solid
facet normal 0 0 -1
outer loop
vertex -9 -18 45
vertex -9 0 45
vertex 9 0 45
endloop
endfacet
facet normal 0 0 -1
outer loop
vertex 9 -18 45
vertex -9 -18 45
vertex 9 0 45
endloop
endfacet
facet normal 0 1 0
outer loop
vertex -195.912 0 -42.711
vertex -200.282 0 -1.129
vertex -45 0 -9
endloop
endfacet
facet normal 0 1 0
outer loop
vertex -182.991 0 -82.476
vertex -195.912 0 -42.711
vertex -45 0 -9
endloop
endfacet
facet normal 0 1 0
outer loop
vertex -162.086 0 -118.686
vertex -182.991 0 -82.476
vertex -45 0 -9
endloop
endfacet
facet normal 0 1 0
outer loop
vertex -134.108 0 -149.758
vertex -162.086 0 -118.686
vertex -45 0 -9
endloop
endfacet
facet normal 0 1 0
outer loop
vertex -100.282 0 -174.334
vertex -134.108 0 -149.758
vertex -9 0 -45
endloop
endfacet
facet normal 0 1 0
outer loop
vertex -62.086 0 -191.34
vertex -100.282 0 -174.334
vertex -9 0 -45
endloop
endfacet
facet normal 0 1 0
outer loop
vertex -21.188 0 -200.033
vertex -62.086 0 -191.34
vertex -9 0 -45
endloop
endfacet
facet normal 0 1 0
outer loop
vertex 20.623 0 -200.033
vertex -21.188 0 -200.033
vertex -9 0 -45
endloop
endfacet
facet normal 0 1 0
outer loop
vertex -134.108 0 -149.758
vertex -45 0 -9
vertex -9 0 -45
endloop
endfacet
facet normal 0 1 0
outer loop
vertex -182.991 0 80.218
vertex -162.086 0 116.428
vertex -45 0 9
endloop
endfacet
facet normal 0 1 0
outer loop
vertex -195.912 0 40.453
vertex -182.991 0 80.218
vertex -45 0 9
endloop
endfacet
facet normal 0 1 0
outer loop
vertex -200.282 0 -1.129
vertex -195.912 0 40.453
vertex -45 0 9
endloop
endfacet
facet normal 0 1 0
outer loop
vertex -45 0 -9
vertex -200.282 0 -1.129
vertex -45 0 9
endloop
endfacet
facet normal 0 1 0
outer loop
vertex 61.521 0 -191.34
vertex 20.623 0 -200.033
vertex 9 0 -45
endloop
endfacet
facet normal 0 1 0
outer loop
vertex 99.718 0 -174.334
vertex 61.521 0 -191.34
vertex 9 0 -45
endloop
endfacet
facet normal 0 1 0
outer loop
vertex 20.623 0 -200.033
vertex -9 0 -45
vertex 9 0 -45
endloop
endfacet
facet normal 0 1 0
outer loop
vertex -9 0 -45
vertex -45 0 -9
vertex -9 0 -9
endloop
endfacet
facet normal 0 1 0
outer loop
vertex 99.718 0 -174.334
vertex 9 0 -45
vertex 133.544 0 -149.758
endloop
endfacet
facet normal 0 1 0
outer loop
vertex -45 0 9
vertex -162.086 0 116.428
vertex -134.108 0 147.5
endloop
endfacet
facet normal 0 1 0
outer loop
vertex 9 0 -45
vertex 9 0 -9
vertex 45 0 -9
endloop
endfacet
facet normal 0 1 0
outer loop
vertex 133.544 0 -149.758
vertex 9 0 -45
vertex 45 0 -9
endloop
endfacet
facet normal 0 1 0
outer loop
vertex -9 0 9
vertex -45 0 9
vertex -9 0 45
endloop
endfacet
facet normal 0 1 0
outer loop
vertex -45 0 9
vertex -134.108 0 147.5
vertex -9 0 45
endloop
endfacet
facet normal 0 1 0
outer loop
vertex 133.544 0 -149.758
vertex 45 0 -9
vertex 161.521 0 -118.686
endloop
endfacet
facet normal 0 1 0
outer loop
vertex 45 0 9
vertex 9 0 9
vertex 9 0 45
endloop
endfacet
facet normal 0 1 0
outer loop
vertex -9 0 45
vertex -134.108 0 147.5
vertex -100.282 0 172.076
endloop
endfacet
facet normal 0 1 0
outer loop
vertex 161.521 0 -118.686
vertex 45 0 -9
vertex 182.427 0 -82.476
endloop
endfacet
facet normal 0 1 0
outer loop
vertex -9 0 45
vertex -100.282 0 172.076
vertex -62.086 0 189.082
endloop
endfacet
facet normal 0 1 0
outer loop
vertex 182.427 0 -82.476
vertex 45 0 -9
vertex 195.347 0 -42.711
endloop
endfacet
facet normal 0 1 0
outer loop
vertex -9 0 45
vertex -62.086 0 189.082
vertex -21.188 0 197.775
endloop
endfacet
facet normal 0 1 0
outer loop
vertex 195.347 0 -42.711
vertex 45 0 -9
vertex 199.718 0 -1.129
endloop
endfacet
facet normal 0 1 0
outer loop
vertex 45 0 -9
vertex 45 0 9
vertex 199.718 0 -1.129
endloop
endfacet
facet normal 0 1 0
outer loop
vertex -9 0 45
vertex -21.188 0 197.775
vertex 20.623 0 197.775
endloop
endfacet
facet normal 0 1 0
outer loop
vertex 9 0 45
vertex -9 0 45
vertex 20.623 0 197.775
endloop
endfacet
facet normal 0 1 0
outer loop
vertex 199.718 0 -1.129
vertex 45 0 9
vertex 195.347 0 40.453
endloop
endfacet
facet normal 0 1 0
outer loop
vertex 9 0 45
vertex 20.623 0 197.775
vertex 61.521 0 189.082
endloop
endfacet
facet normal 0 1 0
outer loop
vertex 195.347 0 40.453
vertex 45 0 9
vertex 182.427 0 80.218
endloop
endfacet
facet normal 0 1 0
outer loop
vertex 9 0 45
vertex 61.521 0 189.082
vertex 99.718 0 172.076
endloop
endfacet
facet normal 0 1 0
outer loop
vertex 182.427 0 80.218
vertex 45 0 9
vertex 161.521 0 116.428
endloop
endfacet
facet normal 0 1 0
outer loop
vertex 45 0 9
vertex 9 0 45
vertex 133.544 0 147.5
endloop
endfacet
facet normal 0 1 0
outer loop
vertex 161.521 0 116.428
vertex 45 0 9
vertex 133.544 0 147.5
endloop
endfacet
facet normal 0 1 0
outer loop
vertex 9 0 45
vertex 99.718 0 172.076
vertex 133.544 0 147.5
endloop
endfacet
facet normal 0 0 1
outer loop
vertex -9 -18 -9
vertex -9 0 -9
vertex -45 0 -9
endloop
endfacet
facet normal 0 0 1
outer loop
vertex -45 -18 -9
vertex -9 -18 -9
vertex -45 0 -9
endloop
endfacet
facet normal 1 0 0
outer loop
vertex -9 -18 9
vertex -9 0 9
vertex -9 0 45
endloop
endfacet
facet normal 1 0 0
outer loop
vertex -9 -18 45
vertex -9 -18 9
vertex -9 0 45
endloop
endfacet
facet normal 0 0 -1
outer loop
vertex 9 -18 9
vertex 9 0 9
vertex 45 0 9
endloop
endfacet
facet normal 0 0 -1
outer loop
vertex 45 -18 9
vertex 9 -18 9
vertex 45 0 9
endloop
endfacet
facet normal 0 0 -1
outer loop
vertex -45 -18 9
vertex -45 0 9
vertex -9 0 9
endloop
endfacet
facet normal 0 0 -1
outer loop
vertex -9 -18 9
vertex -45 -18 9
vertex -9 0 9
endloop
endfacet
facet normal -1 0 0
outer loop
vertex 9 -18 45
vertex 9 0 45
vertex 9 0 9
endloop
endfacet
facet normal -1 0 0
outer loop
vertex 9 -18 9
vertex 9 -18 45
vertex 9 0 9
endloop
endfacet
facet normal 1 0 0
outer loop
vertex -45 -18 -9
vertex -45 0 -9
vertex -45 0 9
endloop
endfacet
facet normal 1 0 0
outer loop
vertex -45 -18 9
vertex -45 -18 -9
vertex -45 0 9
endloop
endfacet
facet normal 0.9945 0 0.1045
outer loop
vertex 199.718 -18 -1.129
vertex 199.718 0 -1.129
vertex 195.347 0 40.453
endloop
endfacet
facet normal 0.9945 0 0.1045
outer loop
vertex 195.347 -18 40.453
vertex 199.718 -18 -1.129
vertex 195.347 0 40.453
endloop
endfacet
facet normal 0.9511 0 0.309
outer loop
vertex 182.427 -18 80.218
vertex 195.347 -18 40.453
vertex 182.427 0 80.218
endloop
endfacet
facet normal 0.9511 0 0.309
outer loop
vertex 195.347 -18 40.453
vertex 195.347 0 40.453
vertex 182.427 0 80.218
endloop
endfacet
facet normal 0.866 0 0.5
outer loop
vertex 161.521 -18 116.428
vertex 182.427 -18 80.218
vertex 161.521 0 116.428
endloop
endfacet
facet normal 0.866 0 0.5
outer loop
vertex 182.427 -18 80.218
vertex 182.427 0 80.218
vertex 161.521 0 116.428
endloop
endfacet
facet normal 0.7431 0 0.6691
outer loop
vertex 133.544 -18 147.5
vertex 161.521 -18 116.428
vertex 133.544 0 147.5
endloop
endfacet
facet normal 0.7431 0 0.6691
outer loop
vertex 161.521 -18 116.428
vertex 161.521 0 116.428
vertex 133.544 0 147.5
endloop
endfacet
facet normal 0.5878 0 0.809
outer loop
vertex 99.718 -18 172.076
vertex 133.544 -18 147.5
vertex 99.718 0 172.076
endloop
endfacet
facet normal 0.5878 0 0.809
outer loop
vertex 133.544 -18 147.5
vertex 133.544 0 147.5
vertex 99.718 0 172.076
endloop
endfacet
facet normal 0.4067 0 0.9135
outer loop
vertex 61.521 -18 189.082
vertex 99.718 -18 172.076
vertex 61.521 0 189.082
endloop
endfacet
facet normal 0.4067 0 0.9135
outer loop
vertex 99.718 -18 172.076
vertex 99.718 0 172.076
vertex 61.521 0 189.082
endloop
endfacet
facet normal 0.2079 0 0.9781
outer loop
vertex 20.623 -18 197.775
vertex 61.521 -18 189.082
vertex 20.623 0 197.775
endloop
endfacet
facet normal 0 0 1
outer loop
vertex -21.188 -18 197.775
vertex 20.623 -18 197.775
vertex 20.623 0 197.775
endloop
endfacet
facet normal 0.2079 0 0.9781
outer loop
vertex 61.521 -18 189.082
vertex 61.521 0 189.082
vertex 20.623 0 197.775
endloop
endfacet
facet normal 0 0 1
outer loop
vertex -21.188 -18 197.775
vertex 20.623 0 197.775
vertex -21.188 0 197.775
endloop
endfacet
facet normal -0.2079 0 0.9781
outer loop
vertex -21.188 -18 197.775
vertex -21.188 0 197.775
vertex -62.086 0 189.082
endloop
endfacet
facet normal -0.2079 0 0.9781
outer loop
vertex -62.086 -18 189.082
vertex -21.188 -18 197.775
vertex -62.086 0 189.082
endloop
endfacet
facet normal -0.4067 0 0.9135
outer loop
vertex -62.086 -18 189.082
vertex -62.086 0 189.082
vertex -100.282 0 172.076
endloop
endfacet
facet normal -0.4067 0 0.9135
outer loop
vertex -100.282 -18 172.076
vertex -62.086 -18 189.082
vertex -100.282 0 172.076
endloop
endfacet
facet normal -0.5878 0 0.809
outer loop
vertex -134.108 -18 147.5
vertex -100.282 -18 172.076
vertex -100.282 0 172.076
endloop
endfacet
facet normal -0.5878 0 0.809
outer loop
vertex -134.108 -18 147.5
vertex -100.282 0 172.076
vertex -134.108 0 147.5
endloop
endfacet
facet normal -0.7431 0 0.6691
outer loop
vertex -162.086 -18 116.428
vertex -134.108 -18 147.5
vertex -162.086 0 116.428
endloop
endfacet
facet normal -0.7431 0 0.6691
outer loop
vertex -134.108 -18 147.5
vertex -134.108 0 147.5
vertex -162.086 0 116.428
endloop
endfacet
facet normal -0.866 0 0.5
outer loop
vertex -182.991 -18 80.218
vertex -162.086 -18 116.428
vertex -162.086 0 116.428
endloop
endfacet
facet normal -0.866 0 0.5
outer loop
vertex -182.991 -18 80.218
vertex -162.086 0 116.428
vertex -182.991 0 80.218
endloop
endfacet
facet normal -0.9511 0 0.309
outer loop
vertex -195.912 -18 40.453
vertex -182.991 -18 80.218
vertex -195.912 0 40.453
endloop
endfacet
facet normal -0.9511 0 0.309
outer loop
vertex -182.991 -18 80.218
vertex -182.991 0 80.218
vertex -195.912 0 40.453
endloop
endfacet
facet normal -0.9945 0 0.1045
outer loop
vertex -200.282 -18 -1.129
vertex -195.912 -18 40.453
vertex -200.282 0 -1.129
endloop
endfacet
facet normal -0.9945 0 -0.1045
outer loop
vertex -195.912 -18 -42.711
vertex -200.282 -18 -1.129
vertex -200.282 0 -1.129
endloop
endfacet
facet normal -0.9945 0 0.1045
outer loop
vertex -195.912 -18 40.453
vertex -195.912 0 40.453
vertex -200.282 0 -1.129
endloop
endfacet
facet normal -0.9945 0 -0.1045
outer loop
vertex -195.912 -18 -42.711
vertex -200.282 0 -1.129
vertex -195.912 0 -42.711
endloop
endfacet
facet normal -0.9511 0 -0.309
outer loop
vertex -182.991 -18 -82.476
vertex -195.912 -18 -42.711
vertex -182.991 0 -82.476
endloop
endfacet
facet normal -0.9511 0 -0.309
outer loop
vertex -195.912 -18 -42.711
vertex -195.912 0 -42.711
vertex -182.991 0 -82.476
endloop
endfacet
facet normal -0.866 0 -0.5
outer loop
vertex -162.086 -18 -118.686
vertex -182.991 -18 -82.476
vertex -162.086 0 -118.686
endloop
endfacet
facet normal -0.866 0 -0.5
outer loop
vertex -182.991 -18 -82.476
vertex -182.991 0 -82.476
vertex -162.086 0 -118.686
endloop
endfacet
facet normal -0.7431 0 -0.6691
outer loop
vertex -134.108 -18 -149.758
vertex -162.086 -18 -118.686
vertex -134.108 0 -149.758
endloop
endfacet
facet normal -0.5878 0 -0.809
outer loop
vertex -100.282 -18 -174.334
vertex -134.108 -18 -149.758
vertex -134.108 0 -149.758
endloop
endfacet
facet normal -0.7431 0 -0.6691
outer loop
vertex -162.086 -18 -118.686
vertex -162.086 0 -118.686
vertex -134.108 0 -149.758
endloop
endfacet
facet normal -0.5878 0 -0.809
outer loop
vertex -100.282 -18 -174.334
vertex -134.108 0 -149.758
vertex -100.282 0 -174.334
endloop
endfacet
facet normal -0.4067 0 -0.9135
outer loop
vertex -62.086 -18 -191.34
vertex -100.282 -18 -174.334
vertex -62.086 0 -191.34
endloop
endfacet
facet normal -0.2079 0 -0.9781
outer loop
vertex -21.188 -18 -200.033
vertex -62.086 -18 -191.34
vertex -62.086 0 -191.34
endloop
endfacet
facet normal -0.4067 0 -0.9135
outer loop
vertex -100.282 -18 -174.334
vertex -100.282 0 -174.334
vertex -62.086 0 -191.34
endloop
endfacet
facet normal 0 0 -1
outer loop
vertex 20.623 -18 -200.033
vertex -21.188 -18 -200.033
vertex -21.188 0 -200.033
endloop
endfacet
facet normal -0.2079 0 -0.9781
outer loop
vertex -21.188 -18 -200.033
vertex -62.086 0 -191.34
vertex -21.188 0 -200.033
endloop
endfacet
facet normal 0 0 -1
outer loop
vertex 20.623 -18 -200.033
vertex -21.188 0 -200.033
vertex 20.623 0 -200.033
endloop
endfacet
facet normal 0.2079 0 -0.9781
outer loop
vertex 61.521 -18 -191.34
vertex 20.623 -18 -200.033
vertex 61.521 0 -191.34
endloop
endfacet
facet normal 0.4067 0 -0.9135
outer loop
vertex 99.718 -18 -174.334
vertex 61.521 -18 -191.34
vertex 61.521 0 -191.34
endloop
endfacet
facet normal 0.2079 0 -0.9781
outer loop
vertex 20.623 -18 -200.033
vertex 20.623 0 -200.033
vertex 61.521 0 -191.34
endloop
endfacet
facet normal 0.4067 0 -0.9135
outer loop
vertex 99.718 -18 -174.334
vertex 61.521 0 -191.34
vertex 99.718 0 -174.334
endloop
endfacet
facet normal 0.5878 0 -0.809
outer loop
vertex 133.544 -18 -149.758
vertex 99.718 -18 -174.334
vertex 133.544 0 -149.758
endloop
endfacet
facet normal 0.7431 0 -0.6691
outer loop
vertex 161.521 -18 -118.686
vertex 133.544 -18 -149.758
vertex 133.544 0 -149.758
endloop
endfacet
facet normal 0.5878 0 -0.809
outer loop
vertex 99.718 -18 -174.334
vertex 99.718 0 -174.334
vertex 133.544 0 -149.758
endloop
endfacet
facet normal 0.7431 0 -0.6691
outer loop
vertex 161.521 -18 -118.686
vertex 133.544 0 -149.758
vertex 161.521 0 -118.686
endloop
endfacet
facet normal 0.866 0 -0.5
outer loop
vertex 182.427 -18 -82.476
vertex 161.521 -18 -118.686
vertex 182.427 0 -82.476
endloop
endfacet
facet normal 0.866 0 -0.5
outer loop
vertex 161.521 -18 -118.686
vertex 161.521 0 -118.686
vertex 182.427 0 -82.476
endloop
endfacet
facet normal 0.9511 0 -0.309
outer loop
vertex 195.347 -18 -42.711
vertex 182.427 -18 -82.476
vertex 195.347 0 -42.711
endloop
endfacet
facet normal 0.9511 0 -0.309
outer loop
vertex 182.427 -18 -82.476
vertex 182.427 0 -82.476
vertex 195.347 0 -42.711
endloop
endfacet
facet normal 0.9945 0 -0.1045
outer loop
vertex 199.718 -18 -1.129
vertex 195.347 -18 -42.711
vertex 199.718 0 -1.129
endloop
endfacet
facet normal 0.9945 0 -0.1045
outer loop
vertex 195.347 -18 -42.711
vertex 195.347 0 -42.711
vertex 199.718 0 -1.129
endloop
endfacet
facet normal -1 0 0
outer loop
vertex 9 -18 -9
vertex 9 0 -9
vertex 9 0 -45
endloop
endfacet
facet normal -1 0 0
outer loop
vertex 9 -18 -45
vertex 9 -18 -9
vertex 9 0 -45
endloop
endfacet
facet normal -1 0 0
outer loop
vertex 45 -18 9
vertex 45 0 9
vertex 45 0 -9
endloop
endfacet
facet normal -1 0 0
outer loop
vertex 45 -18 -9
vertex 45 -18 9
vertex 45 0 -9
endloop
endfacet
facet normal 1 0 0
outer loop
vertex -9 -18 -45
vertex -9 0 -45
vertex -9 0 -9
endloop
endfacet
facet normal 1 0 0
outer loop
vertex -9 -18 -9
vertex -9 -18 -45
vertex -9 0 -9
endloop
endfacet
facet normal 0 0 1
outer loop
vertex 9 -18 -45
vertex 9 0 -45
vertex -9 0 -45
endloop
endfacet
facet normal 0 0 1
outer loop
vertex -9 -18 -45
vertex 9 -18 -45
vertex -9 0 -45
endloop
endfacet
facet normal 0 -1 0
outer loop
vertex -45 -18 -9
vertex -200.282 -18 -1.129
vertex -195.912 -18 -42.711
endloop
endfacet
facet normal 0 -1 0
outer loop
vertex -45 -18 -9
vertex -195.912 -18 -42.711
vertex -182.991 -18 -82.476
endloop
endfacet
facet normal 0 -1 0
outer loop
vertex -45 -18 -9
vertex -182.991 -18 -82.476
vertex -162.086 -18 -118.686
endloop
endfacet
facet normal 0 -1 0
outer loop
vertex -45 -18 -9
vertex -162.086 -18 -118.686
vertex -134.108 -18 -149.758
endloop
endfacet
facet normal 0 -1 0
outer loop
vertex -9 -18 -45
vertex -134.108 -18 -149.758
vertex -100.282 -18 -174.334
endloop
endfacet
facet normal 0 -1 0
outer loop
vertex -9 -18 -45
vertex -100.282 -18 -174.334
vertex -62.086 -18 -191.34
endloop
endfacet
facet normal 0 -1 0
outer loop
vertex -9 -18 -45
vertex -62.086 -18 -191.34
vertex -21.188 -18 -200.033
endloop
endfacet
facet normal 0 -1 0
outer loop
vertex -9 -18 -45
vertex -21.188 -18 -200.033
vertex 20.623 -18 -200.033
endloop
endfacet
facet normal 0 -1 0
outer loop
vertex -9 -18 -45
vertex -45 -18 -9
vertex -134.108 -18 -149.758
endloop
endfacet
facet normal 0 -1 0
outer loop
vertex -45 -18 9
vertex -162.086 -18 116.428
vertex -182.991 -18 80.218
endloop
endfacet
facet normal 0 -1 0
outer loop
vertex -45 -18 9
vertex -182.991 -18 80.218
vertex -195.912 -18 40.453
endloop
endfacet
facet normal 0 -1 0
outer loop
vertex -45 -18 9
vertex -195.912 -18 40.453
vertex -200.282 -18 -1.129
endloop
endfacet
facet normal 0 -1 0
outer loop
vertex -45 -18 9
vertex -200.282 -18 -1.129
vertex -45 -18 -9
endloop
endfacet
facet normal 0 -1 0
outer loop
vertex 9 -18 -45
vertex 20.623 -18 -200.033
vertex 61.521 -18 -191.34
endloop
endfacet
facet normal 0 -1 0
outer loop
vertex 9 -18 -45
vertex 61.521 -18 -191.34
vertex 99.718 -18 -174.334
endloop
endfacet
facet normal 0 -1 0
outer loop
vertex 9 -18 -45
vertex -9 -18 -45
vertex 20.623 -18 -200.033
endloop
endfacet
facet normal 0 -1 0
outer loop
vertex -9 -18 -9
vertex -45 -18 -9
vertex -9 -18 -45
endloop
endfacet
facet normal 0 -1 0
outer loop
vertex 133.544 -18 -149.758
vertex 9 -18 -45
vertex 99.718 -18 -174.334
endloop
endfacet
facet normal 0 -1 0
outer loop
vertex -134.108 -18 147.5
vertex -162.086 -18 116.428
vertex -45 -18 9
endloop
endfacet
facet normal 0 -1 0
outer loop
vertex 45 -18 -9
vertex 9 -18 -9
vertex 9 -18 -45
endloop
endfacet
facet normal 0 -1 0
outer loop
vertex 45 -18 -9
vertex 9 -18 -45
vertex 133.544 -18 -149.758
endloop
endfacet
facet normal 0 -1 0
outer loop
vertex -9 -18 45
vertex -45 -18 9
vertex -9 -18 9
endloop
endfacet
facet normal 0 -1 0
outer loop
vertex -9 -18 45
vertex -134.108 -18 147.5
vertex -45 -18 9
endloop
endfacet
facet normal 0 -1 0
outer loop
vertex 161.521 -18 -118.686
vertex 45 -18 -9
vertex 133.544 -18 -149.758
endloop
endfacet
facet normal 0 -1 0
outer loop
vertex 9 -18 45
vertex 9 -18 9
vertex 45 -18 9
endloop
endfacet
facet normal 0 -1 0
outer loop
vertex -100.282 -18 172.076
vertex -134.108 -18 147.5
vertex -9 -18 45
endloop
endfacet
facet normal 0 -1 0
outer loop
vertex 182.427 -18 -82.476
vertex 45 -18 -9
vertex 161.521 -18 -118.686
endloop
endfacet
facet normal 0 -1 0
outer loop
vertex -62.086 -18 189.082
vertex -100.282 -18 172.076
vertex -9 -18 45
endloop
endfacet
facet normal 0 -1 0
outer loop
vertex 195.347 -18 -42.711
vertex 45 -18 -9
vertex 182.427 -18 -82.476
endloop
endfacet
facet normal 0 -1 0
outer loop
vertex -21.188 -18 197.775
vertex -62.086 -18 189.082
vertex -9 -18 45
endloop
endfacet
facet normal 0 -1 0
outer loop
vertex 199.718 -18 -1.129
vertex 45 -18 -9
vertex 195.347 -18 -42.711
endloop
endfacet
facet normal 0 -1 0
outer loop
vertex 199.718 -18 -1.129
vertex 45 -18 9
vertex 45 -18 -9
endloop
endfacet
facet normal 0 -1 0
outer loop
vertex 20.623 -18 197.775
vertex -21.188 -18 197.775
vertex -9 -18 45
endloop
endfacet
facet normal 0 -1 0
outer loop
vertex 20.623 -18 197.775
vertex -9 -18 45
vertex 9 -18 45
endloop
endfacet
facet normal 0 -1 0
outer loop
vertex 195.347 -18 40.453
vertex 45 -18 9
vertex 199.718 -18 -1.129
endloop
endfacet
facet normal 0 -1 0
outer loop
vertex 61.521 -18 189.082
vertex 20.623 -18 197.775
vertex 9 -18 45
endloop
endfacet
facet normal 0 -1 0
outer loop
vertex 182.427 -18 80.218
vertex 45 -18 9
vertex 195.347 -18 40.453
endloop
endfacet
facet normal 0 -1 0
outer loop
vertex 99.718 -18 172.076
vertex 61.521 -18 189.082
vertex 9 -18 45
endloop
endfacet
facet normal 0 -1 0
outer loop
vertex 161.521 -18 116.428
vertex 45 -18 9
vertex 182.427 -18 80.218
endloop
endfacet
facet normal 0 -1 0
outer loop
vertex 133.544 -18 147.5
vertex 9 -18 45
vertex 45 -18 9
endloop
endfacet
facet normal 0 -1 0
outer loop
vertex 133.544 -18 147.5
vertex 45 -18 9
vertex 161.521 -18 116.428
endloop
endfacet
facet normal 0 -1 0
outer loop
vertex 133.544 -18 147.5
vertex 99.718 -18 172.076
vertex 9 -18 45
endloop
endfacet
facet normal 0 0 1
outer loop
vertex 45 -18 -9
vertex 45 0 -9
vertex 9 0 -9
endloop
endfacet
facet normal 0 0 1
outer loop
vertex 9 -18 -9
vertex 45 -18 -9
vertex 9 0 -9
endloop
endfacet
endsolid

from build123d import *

# Parameters (mm, degrees)
F0_R     = 200
F1_DEPTH = 18


with BuildPart() as f1:
    # F0 (on Front) → F1 (new body)
    with BuildSketch(Plane.XZ):
        with Locations((-0.282222, -1.128889)):
            Circle(F0_R)
        Polygon((9, -9), (9, -45), (-9, -45), (-9, -9), (-45, -9), (-45, 9), (-9, 9), (-9, 45), (9, 45), (9, 9), (45, 9), (45, -9), align=None, mode=Mode.SUBTRACT)
    extrude(amount=F1_DEPTH)


solid = f1.part
